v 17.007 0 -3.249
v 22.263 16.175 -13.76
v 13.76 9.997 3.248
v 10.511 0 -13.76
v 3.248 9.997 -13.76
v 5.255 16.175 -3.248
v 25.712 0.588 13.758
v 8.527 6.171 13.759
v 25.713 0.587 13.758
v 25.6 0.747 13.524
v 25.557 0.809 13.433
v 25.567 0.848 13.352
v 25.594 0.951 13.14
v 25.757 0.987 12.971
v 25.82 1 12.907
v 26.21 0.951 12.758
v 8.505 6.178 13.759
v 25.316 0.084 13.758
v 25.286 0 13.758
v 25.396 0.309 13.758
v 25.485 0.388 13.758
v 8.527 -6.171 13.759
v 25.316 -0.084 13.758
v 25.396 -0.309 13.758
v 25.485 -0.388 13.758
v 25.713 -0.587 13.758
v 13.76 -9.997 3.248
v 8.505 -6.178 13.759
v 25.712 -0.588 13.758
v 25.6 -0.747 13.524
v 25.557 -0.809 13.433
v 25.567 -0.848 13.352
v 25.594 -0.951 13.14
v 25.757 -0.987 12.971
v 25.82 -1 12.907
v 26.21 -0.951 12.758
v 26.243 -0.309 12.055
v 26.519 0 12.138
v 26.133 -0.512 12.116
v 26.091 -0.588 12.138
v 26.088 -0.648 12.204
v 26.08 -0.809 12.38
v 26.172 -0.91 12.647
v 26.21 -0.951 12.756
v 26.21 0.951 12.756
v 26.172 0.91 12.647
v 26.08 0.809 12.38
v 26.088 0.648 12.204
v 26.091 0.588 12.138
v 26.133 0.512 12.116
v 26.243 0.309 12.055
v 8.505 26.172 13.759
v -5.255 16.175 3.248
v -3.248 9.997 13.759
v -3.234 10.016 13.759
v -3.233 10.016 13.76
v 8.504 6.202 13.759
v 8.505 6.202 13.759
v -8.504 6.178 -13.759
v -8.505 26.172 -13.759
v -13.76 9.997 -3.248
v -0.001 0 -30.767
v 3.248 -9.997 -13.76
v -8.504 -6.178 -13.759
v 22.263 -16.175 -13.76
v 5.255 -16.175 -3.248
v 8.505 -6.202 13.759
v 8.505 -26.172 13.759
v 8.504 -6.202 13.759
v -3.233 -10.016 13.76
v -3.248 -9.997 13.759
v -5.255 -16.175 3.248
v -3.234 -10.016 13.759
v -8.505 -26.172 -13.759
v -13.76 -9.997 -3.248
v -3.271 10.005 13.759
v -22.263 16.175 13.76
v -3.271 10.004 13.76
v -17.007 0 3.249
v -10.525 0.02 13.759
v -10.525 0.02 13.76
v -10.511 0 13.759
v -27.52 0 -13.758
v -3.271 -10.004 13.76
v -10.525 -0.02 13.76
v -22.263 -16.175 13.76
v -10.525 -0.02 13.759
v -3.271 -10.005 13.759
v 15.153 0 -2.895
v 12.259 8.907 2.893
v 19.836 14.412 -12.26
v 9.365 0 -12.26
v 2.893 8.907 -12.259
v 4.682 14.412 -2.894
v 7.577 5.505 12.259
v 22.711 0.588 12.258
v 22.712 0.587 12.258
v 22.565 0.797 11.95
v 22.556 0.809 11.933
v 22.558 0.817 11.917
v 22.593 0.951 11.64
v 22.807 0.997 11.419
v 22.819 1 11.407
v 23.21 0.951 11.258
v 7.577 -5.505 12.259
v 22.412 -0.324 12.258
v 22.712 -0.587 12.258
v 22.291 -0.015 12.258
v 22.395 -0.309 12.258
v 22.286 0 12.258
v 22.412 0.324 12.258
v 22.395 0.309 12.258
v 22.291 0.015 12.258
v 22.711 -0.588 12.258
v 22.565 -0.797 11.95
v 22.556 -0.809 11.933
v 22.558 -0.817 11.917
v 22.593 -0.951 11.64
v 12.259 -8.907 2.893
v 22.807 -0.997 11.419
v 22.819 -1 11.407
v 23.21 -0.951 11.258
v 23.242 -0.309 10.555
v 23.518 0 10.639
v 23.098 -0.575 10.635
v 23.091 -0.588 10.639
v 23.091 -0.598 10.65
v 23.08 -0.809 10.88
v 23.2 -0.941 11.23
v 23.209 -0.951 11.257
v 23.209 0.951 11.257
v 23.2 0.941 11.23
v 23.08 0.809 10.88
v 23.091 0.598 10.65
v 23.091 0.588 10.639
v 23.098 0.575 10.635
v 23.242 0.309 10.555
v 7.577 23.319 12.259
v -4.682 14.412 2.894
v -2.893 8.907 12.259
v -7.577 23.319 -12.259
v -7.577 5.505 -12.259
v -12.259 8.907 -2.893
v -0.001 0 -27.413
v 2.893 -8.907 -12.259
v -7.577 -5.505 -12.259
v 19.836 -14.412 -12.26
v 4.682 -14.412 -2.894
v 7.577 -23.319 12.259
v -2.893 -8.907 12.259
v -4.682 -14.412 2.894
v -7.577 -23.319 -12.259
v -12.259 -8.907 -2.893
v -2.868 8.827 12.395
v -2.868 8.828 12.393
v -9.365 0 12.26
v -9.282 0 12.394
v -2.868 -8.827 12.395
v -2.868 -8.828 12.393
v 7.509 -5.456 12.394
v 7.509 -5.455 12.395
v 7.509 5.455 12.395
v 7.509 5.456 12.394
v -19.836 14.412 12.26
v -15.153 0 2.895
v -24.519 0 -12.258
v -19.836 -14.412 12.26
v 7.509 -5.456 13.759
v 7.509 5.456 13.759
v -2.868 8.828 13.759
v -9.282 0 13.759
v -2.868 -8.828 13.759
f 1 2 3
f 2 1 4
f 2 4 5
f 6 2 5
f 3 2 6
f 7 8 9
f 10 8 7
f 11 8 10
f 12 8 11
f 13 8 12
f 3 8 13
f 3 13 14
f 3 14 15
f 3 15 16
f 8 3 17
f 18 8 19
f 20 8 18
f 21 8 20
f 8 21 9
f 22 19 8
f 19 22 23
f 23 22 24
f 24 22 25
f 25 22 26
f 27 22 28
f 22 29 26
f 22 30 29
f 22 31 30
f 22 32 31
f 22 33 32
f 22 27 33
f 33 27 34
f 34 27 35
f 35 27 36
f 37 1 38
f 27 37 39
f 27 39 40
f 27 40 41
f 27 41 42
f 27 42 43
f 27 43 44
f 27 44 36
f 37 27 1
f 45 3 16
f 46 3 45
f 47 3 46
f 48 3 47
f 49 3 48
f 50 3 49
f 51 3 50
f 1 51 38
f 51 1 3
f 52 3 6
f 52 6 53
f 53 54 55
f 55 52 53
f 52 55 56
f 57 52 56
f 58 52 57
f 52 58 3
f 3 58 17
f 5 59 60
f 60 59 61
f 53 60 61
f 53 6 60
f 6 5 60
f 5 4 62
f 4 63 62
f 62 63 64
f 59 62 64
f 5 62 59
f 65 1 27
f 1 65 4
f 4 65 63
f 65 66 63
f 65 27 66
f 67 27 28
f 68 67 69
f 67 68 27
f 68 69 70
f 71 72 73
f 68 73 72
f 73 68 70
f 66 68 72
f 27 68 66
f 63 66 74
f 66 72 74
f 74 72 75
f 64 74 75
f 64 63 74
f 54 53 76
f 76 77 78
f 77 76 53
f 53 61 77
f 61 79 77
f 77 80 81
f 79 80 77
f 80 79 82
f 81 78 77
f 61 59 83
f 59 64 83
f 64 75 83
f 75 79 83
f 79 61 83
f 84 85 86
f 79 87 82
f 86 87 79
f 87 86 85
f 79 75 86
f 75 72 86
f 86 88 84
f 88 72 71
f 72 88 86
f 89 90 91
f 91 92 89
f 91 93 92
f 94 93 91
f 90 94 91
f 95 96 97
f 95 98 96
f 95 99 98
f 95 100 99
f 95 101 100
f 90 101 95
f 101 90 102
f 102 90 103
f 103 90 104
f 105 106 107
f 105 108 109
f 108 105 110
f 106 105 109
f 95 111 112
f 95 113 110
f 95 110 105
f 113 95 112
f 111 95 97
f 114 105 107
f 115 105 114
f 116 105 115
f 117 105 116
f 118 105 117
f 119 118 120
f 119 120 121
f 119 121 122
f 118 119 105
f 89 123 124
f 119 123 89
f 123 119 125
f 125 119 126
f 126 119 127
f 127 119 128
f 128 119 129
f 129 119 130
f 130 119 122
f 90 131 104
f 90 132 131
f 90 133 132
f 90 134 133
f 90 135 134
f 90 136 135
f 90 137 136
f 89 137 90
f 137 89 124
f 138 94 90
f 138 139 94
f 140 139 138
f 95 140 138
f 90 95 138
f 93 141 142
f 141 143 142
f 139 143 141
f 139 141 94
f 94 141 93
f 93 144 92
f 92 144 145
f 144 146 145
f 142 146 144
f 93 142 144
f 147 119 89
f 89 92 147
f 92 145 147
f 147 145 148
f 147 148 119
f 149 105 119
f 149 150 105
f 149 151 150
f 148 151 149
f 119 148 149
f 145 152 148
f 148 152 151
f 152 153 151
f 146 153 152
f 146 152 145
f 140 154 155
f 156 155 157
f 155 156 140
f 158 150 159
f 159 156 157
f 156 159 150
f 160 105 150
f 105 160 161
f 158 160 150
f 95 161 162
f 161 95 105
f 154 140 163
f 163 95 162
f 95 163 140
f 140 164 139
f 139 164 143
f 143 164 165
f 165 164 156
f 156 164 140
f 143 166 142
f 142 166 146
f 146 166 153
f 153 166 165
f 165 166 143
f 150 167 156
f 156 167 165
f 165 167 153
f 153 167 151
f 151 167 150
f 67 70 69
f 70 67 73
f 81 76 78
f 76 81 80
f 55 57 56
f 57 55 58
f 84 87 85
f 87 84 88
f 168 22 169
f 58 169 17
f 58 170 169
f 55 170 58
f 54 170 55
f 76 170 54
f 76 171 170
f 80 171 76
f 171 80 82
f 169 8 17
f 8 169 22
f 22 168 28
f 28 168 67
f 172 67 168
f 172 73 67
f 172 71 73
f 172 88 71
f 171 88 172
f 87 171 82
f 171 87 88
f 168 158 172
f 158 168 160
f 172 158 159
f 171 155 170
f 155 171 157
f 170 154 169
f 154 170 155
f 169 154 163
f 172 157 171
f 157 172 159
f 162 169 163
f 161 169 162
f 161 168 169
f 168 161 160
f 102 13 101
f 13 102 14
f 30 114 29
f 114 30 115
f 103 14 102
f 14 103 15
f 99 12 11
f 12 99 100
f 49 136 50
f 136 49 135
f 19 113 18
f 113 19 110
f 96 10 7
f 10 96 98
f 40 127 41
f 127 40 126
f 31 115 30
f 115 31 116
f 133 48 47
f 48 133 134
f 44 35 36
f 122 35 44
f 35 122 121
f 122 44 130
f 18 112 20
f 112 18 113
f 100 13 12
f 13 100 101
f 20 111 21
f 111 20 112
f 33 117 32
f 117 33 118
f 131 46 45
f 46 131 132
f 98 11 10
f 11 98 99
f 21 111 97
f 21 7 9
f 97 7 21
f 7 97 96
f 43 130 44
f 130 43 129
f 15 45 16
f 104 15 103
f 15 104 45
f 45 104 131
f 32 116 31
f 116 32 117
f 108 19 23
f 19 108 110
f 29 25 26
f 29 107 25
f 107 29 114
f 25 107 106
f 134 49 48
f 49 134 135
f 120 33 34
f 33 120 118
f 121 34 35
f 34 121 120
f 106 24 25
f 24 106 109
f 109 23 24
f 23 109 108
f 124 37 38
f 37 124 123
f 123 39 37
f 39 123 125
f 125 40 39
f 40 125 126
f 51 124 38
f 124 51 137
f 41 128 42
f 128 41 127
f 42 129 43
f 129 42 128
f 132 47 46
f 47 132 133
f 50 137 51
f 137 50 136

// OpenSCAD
arete = 12.356;
creux = 1; // creux ou plein || 1 ou 0
paroi = 1.5;
echelleReductionAjustementBouchon = 0.972;
bouchon = 0; // 1 ou 0
corps = 1; // 1 ou 0
sideHole = 1;
sideHoleDiameter = 1;

// Controle rotation viewport quand animation en route
//$vpr = [70, 0, $t * 180];

/* Forme
Choix parmi:
- 0 => Etoilé
- 1 => Christique
- 2 => Christique_inversé
- 3 => Pentakis // (all points on sphere)
- 4 => Animate // voir plus bas pour plus d'infos
*/
forme_ID = 0;

/////////

function dodeca_ext_radius(a) =
    a/2*(sqrt(2));

function dodeca_sphere_inscrite_radius(a) =
    a*sqrt(5/8+11/(8*sqrt(5)));

function dodeca_arete_from_sphere_inscrite(radius) =
    radius/sqrt(5/8+11/(8*sqrt(5)));

spike = [
    2.3417, // Etoilé, scale 1 is arete = 1.236 mm, diametre = 6.24 mm, arete pyramide = 2 mm
    0.8944, // Christique, scale 1 is arete = 1.236 mm, diametre = 4.05 mm
    -0.8944, // Christique inversé
    0.4279 // Pentakis
];

if (forme_ID == 4) {
    Animate();
} else {
    if (creux == 0) {
        small_stellated_dodecahedron(spike[forme_ID], small_stellated_dodecahedron);
    } else {
        if (corps == 1) {
            corps_ouvert();
        }
        if (bouchon == 1) {
            bouchon();
        }
    }
}


//		poly_creux();
//		decoupe_bouchon();

module corps_ouvert() {
//    rotate([180, 0, 0])
	difference() {
		poly_creux();
		decoupe_bouchon();
        if (sideHole) {
            rotate([0,0,90]) rotate([180-116.56])
            translate([0,0,arete*2])
            #cylinder(h=paroi*10, r=sideHoleDiameter, center=false, $fn=20);

        }
	}
}

module poly_creux() {
    areteInt = dodeca_arete_from_sphere_inscrite(dodeca_sphere_inscrite_radius(arete)-paroi);

    echo("arete int: ", areteInt);
    render(convexity=2)
    difference() {
        small_stellated_dodecahedron(spike[forme_ID], arete);
        small_stellated_dodecahedron(spike[forme_ID], areteInt);
    }
}

module decoupe_bouchon(scale=1) {
    distance = dodeca_sphere_inscrite_radius(arete);
	rotate([0,0,36]) translate([0,0, distance])
		cylinder(99, r=arete*0.853, $fn=5, center=false);
	rotate([0,0,36]) translate([0,0, distance-paroi])
		cylinder(paroi, r=(arete-paroi)*0.855*scale, $fn=5, center=false);
}

module supplement_feuillure_bouchon() {
    distance = dodeca_sphere_inscrite_radius(arete);
    rotate([0,0,36]) translate([0,0, distance-paroi-1])
    difference() {
		cylinder(paroi+2, r=(arete-paroi)*0.85, $fn=5, center=false);
		cylinder(paroi+2, r=(arete-2*paroi)*0.85, $fn=5, center=false);
    }
}

module bouchon() {
//	scale([echelleReductionAjustementBouchon, echelleReductionAjustementBouchon, 0.995])
	difference () {
        intersection() {
            union() {
                poly_creux();
                supplement_feuillure_bouchon();
            }
            decoupe_bouchon(echelleReductionAjustementBouchon);
        }
	}
}

// }}

/*
animates the single parameter of the
module small_stellated_dodecahedron

1/ choose animate in the view menu
2/ sets fps to an appropiate number for
your machine - 20 is good
3/ set steps to a number that keeps the
change from happening too slowly or
too fast - 200 is good
*/
module Animate() {
    small_stellated_dodecahedron(-3.4317*abs(2*$t-1)+2.4317);
}

// Étoilé
// scale 1 is arete = 1.236 mm, diametre = 6.24 mm, arete pyramide = 2 mm
module Etoile(a) {
    small_stellated_dodecahedron(2.3417, a);
}

// Christique
// scale 1 is arete = 1.236 mm, diametre = 4.05 mm
module Christique(a) {
    small_stellated_dodecahedron(0.8944, a);
}

// Christique inversé
module Christique_inv(a) {
    small_stellated_dodecahedron(-0.8944, a);
}

// Pentakis (all points on sphere)
module Pentakis(a) {
    small_stellated_dodecahedron(0.4279, a);
}

module small_stellated_dodecahedron(scale, ar)
{
a=scale*0.61803;
b=scale*0.38197;

length = ar ? ar : arete;
echo("length:", length);
// scale(1) => arete 1.236 mm
scale(length/1.236)

// Posé sur 3 pointes
//rotate([20.91, 0, 0])

// Posé sur 1 pointe
rotate([0, 31.72, 0])

/*
constructed from 12 pentagonal pyramids placed
on the faces of a dodecahedron.
first 20 points are the vertices of a dodecahedron
next 12 points are the vertices of the centers
of the faces of the dodecahedron

if scale = 0 a dodecahedron is created

if scale is positive the centers of the
faces are moved out fron the center of the
dodecahedron

if scale is negative the centers of the
faces are moved in towards the center of the
dodecahedron

the apex angles of the triangles that make up
the faces of the stellated dodecahedron
are 36 degrees - the scale factor that
makes a small stellated dodecahedron
is approximately 2.3417
length of side of pentagonal pyramid for
small stellated dodecahedron = 2

the apex angles of the triangles that make up
the faces of a pentakis dodecahedron ( one of
the Catalan solids) are about 68.619 degrees
the scale factor to make one is ca 0.4279

if len = length of the sides of the
pentagonal pyramid then approximately

scale = + or - sqrt((len*len/0.52786) - 2.09443)

lengths of the sides of the base are sqrt(5)-1
or 1.23607 to make equilateral triangles scale
factor is 0.8944

distance from centers of faces to origin ca 1.37638
distance from dodecahedral points to origin sqrt(3)




pcm

*/

polyhedron
       (points = [
                 [   1.00000,   1.00000,   1.00000],
                 [   1.00000,   1.00000,  -1.00000],
                 [   1.00000,  -1.00000,   1.00000],
                 [   1.00000,  -1.00000,  -1.00000],
                 [  -1.00000,   1.00000,   1.00000],
                 [  -1.00000,   1.00000,  -1.00000],
                 [  -1.00000,  -1.00000,   1.00000],
                 [  -1.00000,  -1.00000,  -1.00000],
                 [   0.00000,   0.61803,   1.61803],
                 [   0.00000,   0.61803,  -1.61803],
                 [   0.00000,  -0.61803,   1.61803],
                 [   0.00000,  -0.61803,  -1.61803],
                 [   0.61803,   1.61803,   0.00000],
                 [   0.61803,  -1.61803,   0.00000],
                 [  -0.61803,   1.61803,   0.00000],
                 [  -0.61803,  -1.61803,   0.00000],
                 [   1.61803,   0.00000,   0.61803],
                 [   1.61803,   0.00000,  -0.61803],
                 [  -1.61803,   0.00000,   0.61803],
                 [  -1.61803,   0.00000,  -0.61803],
                 [   1.17082+a,   0.72361+b,   0.00000],
                 [   0.72361+b,   0.00000,   1.17082+a],
                 [   0.00000,   1.17082+a,   0.72361+b],
                 [   0.00000,   1.17082+a,  -0.72361-b],
                 [   0.72361+b,   0.00000,  -1.17082-a],
                 [   1.17082+a,  -0.72361-b,   0.00000],
                 [   0.00000,  -1.17082-a,   0.72361+b],
                 [   0.00000,  -1.17082-a,  -0.72361-b],
                 [  -0.72361-b,   0.00000,   1.17082+a],
                 [  -1.17082-a,   0.72361+b,   0.00000],
                 [  -0.72361-b,   0.00000,  -1.17082-a],
                 [  -1.17082-a,  -0.72361-b,   0.00000],
                   ],

           faces = [

                [0,20,16],[16,20,17],[17,20,1],
                [1,20,12],[12,20,0],
                [0,21,8],[8,21,10],[10,21,2],
                [2,21,16],[16,21,0],
                 [0,22,12],[12,22,14],[14,22,4],
                [4,22,8],[8,22,0],
                [1,23,9],[9,23,5],[5,23,14],
                [14,23,12],[12,23,1],
                [1,24,17],[17,24,3],[3,24,11],
                [11,24,9],[9,24,1],
                [16,25,2],[17,25,16],[3,25,17],
                 [13,25,3],[2,25,13],
                 [2,26,10],[10,26,6],[6,26,15],
                 [15,26,13],[13,26,2],
                 [3,27,13],[13,27,15],[15,27,7],
                 [7,27,11],[11,27,3],
                [4,28,18],[18,28,6],[6,28,10],
                 [10,28,8],[8,28,4],
                 [4,29,14],[14,29,5],[5,29,19],
                 [19,29,18],[18,29,4],
                  [5,30,9],[9,30,11],[11,30,7],
                 [7,30,19],[19,30,5],
                 [6,31,18],[18,31,19],[19,31,7],
                 [7,31,15],[15,31,6],

                 ]
      );
}
